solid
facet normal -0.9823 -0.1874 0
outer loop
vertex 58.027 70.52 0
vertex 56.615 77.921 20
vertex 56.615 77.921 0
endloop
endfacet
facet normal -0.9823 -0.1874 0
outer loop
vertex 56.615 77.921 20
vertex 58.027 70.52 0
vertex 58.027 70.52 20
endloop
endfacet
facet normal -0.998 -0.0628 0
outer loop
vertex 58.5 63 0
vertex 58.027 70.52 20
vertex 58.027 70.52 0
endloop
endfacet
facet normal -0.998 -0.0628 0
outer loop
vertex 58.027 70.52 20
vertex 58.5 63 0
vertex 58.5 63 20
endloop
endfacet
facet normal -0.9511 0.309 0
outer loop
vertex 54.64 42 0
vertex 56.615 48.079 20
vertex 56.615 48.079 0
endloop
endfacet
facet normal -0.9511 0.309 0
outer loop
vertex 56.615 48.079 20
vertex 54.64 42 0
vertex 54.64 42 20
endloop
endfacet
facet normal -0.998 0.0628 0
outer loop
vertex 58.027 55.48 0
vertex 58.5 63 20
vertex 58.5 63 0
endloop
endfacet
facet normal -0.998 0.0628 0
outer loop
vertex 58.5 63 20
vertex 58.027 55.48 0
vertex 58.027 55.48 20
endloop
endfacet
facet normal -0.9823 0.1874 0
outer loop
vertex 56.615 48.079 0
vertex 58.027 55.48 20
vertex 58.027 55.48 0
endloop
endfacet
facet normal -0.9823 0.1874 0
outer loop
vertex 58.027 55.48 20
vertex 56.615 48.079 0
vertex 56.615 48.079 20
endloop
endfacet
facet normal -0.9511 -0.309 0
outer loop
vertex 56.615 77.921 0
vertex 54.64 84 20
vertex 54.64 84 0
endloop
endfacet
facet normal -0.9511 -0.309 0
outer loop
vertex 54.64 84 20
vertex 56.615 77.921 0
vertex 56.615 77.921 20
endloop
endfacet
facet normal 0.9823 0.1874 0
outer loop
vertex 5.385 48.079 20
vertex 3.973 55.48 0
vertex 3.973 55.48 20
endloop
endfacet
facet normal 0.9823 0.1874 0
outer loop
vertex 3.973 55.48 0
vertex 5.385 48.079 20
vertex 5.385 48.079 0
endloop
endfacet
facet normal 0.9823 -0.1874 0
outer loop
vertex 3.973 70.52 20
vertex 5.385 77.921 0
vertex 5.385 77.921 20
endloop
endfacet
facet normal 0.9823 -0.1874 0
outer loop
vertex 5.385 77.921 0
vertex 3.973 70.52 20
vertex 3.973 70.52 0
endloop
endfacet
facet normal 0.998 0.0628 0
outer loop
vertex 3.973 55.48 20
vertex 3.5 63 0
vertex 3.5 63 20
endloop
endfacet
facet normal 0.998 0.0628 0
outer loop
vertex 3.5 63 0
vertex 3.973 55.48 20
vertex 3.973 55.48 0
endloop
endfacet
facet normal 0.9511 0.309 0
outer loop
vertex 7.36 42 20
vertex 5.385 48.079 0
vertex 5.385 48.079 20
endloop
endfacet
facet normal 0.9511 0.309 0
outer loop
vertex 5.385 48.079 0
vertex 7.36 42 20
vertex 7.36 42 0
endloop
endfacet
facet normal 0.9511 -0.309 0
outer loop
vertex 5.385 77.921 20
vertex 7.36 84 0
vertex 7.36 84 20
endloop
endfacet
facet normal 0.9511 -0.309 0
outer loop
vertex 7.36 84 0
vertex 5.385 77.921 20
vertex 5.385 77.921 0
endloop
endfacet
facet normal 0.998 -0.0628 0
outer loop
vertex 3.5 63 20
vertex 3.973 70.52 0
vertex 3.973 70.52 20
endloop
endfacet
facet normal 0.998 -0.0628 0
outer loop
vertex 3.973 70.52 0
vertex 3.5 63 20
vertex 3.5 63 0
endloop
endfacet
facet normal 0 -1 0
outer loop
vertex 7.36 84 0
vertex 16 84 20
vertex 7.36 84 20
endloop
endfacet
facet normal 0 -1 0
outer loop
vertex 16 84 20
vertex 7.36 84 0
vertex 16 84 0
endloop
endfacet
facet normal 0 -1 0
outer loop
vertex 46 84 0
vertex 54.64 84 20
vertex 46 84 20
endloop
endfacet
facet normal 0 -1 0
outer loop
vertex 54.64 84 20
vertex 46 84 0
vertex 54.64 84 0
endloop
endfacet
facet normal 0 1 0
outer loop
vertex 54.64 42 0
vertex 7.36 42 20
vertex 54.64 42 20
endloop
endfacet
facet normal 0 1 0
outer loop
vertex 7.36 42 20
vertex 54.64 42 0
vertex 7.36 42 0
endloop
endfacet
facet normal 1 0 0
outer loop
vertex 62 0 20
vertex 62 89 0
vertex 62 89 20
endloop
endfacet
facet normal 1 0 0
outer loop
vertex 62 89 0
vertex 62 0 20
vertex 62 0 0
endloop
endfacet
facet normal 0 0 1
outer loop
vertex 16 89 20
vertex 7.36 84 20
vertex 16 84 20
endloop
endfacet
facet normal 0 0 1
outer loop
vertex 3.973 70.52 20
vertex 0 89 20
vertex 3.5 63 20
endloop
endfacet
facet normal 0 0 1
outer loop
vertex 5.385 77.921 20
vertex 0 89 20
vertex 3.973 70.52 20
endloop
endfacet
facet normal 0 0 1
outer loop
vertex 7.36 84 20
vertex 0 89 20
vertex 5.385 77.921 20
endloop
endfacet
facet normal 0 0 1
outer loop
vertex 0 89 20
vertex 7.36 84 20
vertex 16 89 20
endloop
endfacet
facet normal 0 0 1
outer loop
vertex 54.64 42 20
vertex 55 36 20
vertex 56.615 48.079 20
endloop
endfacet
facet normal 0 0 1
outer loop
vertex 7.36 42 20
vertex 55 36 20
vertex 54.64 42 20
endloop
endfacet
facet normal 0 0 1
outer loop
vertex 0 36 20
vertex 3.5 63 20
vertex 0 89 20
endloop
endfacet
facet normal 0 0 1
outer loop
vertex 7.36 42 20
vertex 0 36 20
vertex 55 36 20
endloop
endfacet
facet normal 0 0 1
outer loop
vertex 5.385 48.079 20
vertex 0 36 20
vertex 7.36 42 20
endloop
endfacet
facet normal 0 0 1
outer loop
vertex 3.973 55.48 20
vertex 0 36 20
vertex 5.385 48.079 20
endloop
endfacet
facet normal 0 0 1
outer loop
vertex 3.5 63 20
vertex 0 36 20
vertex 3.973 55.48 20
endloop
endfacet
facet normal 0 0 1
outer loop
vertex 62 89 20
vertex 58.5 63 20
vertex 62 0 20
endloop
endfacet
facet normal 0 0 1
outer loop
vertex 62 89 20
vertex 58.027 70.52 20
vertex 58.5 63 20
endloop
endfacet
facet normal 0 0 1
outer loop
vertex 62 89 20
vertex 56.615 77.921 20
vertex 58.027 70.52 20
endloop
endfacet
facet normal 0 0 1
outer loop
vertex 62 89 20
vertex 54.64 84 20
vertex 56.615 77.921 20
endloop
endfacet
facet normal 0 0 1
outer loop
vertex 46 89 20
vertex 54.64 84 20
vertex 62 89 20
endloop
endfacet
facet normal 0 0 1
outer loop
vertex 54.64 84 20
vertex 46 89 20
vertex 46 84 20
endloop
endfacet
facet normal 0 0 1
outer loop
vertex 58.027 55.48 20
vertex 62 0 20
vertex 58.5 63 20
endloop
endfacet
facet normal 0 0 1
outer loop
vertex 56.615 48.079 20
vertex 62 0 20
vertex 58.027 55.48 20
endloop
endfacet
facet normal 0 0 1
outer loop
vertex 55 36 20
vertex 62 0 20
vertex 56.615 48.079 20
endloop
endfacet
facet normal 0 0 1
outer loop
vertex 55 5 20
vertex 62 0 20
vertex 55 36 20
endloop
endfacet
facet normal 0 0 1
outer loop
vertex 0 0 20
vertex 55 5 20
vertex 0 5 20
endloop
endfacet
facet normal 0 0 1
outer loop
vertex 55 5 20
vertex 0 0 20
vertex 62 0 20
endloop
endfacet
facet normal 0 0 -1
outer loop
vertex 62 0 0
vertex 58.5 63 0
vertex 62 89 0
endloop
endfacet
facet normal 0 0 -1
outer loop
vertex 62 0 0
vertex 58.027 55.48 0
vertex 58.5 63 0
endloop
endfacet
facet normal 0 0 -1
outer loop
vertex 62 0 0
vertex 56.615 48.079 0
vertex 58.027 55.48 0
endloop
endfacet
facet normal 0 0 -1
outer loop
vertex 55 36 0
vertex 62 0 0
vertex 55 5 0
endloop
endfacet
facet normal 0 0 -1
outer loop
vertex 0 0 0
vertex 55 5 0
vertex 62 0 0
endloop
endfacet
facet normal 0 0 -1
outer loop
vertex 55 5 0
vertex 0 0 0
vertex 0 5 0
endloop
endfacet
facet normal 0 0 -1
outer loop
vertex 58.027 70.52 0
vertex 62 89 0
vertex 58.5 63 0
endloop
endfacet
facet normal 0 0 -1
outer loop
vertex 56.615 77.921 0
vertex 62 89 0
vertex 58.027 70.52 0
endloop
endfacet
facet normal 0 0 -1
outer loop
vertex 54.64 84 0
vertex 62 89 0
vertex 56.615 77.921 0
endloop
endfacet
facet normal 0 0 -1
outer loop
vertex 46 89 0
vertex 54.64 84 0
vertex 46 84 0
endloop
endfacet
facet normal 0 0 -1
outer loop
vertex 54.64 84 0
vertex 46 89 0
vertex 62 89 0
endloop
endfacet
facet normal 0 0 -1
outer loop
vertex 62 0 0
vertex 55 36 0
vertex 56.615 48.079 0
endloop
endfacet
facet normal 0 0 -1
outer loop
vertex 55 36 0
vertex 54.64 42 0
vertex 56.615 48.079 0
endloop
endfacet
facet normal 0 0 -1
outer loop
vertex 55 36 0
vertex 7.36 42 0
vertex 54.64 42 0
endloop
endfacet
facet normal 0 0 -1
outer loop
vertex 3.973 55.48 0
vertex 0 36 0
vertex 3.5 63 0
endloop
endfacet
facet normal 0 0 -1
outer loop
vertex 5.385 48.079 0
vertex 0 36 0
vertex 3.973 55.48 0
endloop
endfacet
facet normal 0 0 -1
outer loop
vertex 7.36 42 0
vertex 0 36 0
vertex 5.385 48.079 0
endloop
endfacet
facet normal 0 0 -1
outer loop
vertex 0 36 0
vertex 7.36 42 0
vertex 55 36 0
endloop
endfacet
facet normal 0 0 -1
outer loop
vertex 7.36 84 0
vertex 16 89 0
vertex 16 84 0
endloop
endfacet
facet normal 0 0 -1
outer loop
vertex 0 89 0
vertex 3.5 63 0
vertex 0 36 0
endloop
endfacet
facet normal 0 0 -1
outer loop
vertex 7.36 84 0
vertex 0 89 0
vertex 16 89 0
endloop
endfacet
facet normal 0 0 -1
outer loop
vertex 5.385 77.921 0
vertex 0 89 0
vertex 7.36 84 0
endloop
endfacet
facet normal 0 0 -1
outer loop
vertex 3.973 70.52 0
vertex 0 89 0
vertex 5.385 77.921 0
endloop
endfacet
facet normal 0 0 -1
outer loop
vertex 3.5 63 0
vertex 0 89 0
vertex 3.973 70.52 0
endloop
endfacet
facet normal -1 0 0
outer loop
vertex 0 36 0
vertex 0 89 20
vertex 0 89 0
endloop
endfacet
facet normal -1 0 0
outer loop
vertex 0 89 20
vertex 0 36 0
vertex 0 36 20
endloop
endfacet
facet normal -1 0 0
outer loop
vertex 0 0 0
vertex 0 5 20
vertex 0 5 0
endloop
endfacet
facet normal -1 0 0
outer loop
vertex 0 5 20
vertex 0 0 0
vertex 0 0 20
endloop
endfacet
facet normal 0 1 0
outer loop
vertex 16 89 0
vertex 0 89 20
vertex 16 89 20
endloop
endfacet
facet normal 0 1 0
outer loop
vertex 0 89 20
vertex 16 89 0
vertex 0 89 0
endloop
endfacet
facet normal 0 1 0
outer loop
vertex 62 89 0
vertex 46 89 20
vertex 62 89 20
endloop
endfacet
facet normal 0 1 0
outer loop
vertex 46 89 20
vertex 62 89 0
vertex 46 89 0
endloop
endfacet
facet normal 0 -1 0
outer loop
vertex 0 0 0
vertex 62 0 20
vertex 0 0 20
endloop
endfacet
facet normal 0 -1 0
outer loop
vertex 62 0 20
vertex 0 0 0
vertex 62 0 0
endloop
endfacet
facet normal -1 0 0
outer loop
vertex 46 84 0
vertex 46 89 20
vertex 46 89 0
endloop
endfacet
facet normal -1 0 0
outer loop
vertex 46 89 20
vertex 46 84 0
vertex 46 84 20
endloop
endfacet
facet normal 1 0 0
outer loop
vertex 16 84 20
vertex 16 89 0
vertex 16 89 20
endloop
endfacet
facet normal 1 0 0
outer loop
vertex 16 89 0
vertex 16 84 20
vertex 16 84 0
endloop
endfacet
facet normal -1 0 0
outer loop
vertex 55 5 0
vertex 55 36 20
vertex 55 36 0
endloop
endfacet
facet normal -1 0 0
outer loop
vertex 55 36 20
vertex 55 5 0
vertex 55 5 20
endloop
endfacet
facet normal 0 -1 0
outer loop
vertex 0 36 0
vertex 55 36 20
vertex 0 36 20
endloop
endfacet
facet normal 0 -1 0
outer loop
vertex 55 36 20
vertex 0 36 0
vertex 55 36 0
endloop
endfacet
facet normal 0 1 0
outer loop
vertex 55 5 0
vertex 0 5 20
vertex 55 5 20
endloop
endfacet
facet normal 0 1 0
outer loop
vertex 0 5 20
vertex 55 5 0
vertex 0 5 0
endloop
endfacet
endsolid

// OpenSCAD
// This work is licensed under the Creative Commons Attribution-ShareAlike 4.0
// International License. To view a copy of this license, visit
// http://creativecommons.org/licenses/by-sa/4.0/

$fn = 50;

width = 55;
height = 42;
heightRadius = 60;
bracketThickness = 20;
powerStripOpeningWidth = 30;
clipOpeningWidth = 31;


module powerStripCrossSection(thickness) {
	intersection() {
		translate([width / 2 - heightRadius, 0, 0])
			cylinder(r=heightRadius, h=thickness, center=true);
		translate([heightRadius - width / 2, 0, 0])
			cylinder(r=heightRadius, h=thickness, center=true);
		cube([width, height, thickness], center=true);
	}
}

difference() {
    totalWidth = width + clipOpeningWidth+3;
	cube([62, totalWidth, bracketThickness]);	
    translate([31 - powerStripOpeningWidth/2, totalWidth-6, -1])
		cube([powerStripOpeningWidth, 7, bracketThickness+2]);
	translate([-1, 5, -1])
		cube([56, clipOpeningWidth, bracketThickness + 2]);
    translate([31, totalWidth-5-height/2, bracketThickness/2])
        powerStripCrossSection(bracketThickness+2);
}
